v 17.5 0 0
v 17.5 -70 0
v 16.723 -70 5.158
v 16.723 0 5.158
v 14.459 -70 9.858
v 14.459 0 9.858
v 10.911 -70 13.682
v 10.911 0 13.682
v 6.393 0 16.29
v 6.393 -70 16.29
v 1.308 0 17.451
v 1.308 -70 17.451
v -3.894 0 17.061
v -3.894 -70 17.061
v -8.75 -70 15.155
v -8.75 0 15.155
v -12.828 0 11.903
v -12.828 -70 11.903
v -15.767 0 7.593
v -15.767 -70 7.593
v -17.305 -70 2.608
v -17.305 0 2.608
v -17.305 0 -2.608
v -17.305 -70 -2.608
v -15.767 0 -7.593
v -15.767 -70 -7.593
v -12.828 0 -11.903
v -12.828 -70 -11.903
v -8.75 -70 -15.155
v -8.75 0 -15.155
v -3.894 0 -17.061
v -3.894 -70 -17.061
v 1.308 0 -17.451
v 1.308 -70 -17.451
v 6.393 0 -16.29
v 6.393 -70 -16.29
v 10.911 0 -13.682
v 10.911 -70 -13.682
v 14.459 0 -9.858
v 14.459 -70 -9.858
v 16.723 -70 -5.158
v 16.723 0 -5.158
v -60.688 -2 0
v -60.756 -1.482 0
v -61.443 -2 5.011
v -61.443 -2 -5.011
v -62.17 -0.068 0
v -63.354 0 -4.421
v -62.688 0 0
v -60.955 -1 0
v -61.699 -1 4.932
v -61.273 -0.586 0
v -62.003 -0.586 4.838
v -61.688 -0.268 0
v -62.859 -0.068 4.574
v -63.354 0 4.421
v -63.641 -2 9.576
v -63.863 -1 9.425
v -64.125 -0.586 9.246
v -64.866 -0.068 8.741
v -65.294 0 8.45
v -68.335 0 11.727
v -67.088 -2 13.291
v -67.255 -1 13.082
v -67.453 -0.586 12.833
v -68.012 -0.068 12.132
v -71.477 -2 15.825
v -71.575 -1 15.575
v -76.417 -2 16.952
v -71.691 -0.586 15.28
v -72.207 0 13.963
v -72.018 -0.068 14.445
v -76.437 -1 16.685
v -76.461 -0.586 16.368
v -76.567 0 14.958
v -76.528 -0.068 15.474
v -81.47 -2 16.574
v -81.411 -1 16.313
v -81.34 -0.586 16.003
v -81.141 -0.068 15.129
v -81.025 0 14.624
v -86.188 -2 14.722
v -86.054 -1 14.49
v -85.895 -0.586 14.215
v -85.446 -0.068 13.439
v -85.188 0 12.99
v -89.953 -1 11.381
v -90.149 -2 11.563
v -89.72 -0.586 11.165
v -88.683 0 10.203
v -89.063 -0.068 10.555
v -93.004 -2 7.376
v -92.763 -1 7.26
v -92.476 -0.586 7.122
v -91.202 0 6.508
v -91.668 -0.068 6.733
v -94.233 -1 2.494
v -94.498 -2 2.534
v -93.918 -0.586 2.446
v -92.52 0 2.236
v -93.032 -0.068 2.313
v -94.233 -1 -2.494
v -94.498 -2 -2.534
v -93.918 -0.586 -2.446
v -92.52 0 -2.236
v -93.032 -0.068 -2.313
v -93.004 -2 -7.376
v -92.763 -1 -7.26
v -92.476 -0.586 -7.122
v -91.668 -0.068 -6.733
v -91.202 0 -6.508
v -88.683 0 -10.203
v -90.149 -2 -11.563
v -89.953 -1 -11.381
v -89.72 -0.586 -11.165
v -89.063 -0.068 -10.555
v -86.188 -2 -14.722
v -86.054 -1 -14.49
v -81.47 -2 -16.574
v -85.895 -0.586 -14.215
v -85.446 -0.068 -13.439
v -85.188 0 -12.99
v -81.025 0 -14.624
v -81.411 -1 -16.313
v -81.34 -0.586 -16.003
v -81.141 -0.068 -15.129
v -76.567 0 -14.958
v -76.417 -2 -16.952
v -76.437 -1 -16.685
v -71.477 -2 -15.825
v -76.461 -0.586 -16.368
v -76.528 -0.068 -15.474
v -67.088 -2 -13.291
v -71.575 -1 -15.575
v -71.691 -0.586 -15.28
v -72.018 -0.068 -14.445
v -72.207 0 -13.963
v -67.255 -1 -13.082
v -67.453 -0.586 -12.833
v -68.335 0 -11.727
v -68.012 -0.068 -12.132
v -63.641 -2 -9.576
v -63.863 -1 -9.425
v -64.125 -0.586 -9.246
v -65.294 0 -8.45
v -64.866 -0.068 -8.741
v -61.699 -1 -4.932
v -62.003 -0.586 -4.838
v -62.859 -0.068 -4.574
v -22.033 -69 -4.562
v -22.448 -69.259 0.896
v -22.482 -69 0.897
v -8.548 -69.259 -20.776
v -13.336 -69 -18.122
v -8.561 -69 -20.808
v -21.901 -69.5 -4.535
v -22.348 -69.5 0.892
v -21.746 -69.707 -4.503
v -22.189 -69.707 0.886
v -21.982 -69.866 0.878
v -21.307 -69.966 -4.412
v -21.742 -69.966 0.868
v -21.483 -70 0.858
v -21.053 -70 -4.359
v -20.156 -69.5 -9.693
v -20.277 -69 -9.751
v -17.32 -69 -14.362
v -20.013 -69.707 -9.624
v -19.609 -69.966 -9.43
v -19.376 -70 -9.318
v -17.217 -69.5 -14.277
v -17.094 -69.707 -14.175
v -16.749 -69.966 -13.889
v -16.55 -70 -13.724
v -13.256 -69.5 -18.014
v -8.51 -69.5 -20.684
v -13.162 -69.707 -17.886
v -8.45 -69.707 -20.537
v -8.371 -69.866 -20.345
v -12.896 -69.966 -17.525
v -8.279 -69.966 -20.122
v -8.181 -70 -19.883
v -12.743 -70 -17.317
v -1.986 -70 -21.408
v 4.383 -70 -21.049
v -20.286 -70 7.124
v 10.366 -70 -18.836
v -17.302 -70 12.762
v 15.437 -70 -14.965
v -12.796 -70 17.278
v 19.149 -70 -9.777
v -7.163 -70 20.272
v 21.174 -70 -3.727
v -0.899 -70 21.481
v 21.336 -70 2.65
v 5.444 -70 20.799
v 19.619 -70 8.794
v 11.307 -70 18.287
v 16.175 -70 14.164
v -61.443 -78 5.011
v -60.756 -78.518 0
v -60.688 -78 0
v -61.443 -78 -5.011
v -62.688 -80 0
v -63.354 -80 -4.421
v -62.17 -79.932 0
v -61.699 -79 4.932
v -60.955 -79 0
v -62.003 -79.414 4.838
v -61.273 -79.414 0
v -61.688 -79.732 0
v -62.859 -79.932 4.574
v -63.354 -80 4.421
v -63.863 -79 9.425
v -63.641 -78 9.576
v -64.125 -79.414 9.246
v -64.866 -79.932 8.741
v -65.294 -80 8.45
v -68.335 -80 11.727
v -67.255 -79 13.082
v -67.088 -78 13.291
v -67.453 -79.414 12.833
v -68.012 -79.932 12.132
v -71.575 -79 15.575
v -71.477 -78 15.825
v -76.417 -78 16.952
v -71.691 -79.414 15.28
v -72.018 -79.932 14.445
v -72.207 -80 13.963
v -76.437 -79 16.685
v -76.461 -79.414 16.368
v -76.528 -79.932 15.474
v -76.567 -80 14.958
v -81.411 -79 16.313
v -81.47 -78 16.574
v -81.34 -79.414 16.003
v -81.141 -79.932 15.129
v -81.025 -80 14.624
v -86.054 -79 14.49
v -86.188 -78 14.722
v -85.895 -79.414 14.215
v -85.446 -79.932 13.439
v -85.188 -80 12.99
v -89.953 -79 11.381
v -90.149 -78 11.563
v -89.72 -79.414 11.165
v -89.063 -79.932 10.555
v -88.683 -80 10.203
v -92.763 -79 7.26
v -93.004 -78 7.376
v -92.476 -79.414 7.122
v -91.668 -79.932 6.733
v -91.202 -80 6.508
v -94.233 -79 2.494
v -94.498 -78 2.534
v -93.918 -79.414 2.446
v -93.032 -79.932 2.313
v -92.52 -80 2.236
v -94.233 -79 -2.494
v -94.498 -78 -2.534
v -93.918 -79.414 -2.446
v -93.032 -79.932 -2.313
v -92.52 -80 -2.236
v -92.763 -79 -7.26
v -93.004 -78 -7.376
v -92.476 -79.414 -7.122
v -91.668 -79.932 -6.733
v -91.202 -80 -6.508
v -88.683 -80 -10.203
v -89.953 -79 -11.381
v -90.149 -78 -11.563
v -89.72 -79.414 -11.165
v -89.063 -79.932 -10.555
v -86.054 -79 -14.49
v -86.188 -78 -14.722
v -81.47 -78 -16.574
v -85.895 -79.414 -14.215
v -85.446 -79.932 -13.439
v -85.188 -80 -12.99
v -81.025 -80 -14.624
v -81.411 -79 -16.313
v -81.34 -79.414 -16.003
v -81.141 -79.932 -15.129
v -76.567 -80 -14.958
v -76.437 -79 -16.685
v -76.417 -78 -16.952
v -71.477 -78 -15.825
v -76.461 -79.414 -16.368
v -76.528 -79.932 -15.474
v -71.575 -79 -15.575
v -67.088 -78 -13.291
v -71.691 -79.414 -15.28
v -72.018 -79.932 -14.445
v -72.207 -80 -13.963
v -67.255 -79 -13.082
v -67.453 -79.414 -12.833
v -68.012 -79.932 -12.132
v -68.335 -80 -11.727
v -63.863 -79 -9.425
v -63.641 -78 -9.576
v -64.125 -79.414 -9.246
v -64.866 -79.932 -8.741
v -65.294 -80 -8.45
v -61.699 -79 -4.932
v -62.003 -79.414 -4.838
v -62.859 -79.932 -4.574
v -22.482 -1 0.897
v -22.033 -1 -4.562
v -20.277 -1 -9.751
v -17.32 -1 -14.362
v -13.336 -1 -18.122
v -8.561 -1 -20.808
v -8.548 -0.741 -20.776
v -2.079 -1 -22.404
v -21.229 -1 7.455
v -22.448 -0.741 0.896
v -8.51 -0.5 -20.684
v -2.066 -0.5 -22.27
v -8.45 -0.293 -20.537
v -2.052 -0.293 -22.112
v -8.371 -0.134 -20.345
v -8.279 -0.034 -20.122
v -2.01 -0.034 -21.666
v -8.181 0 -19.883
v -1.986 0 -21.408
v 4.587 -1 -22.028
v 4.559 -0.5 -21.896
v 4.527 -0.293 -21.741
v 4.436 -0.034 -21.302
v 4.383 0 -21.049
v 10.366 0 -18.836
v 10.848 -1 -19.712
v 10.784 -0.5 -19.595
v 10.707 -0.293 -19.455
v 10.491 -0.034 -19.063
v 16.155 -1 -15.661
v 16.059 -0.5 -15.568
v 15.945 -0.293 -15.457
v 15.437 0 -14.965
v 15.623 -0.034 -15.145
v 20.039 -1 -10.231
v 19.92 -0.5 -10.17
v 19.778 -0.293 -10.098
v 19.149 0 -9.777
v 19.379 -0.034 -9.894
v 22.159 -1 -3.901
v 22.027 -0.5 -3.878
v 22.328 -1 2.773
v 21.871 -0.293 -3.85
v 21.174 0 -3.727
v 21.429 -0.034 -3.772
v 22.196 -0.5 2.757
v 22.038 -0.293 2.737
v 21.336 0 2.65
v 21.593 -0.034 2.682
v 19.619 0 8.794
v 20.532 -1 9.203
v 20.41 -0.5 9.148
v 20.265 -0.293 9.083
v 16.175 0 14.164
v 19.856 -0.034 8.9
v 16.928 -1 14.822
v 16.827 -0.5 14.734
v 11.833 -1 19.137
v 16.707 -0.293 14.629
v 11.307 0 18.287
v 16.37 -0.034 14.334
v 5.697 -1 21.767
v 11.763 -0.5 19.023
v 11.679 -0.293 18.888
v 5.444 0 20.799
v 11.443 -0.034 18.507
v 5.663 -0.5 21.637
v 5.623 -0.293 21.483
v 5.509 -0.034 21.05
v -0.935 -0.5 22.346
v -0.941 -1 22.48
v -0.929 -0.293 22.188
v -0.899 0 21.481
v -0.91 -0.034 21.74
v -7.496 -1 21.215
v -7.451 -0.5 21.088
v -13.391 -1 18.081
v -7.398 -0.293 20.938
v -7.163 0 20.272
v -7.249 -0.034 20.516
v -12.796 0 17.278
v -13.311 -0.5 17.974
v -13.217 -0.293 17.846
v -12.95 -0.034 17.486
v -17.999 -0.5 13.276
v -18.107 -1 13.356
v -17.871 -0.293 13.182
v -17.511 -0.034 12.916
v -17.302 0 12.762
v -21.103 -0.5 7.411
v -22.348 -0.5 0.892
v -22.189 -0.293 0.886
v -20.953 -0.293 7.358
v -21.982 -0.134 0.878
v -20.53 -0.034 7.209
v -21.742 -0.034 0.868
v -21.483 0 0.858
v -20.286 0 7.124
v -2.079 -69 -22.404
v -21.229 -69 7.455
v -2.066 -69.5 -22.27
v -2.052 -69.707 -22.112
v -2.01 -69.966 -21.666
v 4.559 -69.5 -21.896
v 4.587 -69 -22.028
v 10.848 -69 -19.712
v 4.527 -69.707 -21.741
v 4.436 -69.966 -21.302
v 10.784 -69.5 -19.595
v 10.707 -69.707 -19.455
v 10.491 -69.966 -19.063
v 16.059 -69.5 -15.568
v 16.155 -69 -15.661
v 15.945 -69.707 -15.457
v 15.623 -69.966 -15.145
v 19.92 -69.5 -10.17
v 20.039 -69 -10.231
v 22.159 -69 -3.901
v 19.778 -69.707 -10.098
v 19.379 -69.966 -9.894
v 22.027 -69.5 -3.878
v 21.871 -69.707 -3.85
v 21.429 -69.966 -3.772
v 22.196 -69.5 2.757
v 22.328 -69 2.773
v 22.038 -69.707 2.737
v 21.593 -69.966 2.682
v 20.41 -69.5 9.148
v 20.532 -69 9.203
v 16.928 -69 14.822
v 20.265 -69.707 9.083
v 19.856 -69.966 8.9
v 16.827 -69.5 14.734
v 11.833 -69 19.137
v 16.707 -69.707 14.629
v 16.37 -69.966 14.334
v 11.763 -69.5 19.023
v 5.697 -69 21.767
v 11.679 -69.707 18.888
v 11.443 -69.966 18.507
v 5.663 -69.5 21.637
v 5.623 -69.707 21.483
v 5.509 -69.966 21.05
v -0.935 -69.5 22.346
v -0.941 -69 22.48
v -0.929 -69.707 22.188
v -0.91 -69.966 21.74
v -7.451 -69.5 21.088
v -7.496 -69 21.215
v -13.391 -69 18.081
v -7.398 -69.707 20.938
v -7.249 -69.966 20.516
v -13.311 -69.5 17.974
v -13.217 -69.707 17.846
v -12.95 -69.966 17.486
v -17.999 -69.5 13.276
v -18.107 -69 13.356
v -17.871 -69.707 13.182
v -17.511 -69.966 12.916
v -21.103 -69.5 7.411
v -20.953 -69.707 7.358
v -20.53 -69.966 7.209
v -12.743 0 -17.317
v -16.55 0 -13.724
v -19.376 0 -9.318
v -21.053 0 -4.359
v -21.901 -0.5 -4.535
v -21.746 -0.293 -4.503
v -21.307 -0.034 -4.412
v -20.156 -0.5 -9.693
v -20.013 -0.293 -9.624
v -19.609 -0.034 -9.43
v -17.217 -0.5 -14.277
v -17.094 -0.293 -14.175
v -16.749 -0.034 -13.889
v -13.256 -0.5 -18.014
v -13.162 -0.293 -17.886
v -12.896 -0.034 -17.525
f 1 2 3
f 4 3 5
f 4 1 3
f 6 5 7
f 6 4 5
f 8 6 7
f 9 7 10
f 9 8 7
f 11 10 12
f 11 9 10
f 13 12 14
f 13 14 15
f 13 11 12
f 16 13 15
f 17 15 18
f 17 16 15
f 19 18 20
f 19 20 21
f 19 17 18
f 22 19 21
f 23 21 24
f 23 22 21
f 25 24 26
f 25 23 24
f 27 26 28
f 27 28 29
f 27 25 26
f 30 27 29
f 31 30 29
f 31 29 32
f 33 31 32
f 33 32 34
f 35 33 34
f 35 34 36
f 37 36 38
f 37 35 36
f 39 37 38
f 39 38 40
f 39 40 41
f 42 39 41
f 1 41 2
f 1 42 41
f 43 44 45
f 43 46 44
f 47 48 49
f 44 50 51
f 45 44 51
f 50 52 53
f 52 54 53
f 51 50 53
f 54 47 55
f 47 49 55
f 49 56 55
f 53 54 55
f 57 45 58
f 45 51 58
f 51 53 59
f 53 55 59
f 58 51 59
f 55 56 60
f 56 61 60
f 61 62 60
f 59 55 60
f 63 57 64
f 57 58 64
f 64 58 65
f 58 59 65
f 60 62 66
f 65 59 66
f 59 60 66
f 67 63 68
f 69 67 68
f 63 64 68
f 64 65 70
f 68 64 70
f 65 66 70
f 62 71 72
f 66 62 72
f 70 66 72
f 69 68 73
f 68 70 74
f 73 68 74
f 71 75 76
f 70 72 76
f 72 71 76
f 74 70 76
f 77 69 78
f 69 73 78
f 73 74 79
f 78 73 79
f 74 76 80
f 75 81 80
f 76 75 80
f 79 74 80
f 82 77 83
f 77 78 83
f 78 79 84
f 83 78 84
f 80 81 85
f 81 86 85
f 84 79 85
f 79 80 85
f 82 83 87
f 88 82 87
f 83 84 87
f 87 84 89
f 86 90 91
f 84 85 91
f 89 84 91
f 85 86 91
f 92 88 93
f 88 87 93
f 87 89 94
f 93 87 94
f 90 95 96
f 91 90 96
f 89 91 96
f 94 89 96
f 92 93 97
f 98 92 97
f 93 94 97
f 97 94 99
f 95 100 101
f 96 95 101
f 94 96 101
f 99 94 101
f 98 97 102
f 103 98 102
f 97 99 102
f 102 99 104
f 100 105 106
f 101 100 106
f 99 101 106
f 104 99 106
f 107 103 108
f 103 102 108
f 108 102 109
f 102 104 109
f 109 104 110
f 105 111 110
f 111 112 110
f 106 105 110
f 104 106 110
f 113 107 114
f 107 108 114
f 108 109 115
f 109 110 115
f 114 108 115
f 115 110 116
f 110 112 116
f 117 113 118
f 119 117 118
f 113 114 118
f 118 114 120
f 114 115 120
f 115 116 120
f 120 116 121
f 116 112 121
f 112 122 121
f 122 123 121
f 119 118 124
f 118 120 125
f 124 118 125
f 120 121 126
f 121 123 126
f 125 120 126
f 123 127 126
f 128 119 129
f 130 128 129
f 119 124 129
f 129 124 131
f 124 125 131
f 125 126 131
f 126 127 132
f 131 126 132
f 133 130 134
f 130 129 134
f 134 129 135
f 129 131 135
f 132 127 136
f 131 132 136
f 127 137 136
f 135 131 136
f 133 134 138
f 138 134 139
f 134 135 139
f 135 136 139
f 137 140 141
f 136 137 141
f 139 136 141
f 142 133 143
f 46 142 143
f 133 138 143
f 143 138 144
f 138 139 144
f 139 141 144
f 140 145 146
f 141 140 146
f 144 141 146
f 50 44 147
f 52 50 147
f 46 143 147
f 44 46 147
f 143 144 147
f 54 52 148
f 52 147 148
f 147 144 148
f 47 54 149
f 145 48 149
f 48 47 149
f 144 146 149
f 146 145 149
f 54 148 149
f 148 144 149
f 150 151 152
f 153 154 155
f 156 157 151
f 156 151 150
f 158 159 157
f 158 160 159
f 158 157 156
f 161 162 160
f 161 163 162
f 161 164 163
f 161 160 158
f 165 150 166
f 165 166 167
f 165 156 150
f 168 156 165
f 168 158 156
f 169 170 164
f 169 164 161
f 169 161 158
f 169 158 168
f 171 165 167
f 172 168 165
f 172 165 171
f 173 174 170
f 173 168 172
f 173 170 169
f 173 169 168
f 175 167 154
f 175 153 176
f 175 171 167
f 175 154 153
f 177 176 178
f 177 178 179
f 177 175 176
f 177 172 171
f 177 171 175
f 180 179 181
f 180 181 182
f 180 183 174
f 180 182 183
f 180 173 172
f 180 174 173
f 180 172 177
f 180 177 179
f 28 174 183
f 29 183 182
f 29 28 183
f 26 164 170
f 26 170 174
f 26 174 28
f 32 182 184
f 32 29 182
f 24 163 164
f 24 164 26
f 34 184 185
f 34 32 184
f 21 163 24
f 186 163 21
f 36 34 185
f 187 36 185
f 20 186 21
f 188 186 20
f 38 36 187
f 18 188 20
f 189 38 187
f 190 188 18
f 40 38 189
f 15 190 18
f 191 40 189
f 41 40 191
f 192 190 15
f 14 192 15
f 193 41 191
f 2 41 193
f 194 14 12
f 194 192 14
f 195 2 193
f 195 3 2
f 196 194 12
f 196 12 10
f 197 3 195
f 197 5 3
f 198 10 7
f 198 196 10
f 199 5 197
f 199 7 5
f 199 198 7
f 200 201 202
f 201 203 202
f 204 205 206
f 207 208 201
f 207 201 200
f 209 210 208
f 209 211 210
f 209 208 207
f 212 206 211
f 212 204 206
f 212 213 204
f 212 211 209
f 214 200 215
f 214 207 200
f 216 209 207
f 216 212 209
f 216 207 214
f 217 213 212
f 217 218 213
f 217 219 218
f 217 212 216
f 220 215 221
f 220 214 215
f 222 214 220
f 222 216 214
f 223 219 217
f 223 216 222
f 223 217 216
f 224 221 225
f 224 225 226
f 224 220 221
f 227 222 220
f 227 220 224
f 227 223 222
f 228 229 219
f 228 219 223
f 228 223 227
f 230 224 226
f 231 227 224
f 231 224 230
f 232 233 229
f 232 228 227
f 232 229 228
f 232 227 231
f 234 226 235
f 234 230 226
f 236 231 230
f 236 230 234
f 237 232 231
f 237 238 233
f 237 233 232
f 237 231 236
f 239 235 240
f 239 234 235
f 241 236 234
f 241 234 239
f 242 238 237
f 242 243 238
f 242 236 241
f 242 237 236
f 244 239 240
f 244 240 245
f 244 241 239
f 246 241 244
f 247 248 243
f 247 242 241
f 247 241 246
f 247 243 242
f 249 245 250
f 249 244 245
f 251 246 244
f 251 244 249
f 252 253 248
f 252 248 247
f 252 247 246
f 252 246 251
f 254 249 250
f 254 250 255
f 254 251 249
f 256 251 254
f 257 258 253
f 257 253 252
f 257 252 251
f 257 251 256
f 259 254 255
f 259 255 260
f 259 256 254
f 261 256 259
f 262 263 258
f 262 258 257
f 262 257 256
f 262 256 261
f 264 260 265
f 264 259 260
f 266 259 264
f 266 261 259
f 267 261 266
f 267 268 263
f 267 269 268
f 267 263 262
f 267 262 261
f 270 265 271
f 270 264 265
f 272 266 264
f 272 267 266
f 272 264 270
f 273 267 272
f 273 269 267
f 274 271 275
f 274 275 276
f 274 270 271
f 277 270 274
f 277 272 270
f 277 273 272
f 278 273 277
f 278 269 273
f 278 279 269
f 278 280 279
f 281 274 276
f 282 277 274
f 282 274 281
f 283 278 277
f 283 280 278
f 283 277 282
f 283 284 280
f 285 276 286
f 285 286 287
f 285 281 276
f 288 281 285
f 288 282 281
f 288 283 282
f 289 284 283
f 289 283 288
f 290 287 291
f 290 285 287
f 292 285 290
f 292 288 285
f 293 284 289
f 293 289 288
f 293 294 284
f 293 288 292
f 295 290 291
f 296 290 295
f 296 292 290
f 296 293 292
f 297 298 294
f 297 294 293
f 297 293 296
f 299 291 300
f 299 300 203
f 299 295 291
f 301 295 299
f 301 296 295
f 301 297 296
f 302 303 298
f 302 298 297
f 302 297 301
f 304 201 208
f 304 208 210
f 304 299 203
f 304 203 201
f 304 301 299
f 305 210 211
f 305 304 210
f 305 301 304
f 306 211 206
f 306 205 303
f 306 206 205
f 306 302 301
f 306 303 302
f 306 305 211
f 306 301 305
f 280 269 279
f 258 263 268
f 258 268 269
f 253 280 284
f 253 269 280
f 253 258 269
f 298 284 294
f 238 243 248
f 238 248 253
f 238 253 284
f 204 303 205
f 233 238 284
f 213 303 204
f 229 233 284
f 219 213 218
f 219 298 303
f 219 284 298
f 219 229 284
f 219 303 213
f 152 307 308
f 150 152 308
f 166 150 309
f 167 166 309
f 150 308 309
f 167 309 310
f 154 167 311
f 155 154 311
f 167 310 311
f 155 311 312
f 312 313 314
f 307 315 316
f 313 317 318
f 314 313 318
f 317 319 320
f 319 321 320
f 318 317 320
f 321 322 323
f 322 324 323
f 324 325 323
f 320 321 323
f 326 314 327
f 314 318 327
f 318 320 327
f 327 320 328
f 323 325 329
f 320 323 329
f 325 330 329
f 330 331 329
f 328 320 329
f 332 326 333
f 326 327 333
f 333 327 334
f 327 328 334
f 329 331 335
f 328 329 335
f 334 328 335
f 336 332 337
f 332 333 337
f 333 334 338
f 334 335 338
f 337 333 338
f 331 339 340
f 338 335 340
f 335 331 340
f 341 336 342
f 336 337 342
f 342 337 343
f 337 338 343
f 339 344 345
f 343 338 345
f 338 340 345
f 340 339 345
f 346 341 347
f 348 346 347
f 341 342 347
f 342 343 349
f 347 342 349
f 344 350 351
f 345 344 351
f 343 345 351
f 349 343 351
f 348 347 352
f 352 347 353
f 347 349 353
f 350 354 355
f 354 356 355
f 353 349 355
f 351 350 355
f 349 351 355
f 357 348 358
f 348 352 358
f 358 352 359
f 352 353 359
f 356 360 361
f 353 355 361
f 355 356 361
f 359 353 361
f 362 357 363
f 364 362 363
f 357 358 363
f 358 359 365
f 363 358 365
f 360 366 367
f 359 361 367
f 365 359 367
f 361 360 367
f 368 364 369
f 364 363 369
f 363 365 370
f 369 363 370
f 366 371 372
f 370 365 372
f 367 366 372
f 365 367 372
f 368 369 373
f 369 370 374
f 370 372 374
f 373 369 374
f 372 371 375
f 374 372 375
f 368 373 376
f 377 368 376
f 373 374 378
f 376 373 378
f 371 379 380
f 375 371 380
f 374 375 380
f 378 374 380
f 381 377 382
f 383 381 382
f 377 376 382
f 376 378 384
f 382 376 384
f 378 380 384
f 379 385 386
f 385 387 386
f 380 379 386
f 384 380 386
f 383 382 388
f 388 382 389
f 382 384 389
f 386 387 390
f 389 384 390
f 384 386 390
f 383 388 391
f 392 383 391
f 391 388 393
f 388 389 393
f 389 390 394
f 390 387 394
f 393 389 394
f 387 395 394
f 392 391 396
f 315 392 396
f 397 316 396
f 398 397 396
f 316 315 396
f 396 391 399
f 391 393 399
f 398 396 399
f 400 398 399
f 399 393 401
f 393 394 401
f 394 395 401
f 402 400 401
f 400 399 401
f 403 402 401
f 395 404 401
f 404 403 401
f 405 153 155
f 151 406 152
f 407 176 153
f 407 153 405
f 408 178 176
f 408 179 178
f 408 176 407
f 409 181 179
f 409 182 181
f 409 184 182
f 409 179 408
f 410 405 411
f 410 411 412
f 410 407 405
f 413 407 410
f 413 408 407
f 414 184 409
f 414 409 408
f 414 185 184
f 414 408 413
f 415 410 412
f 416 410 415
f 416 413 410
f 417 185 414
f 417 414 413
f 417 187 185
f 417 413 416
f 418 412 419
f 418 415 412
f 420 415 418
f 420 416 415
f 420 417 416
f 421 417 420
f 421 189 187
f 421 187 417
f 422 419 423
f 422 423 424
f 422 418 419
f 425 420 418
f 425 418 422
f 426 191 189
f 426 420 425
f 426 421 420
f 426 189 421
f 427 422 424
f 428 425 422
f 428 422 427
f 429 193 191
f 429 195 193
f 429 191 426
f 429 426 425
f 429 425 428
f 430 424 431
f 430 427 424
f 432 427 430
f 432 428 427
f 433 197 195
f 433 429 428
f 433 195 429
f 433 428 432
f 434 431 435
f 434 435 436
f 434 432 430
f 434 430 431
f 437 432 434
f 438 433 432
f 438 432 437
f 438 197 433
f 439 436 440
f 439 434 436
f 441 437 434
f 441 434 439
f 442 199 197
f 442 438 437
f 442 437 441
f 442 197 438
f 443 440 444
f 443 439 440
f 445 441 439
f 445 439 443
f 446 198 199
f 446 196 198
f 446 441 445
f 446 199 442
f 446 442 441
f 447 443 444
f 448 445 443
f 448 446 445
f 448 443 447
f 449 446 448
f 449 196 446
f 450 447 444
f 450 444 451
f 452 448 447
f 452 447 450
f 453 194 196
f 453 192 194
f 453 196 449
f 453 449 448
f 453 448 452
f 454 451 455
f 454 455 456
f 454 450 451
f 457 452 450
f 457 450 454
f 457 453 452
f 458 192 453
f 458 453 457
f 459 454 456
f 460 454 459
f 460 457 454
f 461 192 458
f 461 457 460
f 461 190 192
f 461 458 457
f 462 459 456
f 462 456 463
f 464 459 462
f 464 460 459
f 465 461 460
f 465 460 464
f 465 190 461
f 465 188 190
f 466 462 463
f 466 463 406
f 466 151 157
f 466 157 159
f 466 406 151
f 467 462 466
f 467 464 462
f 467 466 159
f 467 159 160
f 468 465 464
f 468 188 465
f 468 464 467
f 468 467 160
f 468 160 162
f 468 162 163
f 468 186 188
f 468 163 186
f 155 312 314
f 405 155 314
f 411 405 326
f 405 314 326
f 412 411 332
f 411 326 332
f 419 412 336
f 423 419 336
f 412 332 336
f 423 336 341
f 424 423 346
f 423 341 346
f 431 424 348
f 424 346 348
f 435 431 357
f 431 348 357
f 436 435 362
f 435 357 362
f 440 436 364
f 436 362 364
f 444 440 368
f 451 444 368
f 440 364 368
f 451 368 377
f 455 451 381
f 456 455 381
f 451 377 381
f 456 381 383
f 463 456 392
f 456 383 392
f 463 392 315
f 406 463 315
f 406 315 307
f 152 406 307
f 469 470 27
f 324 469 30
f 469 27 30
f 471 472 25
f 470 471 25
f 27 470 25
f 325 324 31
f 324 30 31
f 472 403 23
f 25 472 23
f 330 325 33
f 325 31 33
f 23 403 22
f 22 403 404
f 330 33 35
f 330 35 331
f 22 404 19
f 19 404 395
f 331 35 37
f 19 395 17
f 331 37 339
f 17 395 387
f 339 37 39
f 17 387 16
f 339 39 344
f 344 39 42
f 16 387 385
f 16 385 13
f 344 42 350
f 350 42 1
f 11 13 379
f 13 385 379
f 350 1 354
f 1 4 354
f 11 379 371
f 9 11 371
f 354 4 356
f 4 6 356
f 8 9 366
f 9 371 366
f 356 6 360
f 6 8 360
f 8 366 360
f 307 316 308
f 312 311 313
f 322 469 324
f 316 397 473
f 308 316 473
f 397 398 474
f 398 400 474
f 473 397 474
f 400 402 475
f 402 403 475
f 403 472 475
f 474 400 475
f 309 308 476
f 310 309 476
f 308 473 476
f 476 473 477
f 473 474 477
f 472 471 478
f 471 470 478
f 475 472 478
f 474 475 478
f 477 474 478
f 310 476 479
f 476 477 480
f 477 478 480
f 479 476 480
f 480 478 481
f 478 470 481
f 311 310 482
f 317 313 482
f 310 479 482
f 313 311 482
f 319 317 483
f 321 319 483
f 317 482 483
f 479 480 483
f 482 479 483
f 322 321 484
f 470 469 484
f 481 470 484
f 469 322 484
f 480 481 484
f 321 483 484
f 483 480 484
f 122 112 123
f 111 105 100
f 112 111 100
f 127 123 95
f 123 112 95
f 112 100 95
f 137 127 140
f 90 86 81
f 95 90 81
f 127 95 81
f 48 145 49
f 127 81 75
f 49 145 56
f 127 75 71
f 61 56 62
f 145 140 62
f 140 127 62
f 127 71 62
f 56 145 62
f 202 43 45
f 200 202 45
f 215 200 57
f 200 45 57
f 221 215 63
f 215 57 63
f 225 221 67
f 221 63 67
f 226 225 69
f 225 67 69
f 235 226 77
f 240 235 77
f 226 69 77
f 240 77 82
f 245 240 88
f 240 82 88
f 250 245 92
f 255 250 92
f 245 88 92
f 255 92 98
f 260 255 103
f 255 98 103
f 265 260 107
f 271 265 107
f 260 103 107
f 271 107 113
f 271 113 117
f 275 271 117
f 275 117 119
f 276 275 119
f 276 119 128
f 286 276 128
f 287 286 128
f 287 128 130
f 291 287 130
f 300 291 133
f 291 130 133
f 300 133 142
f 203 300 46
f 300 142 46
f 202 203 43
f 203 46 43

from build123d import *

# Parameters (mm, degrees)
F0_R     = 17.5
F1_DEPTH = 70
F2_R     = 1
F3_R     = 17
F4_DEPTH = 80
F5_R     = 2


with BuildPart() as f1:
    # F0 (on Front) → F1 (new body)
    with BuildSketch(Plane.XZ):
        with BuildLine():
            ThreePointArc((-8.561161, -20.807607), (18.93934, 12.147074), (-22.482094, 0.897479))
            ThreePointArc((-22.482094, 0.897479), (-18.93934, -12.147074), (-8.561161, -20.807607))
        make_face()
        Circle(F0_R, mode=Mode.SUBTRACT)
    extrude(amount=F1_DEPTH)

    # F2
    f2_edges = [f1.edges().sort_by_distance(p)[0] for p in [
        (22.482094, 0, -0.897479),
        (22.482094, -70, -0.897479),
    ]]
    fillet(f2_edges, radius=F2_R)


with BuildPart() as f4:
    # F3 (on Front) → F4 (new body)
    with BuildSketch(Plane.XZ):
        with Locations((-77.687524, 0)):
            Circle(F3_R)
    extrude(amount=F4_DEPTH)

    # F5
    f5_edges = [f4.edges().sort_by_distance(p)[0] for p in [
        (-94.687524, -80, 0),
        (-94.687524, 0, 0),
    ]]
    fillet(f5_edges, radius=F5_R)


solid = Compound([f1.part, f4.part])
